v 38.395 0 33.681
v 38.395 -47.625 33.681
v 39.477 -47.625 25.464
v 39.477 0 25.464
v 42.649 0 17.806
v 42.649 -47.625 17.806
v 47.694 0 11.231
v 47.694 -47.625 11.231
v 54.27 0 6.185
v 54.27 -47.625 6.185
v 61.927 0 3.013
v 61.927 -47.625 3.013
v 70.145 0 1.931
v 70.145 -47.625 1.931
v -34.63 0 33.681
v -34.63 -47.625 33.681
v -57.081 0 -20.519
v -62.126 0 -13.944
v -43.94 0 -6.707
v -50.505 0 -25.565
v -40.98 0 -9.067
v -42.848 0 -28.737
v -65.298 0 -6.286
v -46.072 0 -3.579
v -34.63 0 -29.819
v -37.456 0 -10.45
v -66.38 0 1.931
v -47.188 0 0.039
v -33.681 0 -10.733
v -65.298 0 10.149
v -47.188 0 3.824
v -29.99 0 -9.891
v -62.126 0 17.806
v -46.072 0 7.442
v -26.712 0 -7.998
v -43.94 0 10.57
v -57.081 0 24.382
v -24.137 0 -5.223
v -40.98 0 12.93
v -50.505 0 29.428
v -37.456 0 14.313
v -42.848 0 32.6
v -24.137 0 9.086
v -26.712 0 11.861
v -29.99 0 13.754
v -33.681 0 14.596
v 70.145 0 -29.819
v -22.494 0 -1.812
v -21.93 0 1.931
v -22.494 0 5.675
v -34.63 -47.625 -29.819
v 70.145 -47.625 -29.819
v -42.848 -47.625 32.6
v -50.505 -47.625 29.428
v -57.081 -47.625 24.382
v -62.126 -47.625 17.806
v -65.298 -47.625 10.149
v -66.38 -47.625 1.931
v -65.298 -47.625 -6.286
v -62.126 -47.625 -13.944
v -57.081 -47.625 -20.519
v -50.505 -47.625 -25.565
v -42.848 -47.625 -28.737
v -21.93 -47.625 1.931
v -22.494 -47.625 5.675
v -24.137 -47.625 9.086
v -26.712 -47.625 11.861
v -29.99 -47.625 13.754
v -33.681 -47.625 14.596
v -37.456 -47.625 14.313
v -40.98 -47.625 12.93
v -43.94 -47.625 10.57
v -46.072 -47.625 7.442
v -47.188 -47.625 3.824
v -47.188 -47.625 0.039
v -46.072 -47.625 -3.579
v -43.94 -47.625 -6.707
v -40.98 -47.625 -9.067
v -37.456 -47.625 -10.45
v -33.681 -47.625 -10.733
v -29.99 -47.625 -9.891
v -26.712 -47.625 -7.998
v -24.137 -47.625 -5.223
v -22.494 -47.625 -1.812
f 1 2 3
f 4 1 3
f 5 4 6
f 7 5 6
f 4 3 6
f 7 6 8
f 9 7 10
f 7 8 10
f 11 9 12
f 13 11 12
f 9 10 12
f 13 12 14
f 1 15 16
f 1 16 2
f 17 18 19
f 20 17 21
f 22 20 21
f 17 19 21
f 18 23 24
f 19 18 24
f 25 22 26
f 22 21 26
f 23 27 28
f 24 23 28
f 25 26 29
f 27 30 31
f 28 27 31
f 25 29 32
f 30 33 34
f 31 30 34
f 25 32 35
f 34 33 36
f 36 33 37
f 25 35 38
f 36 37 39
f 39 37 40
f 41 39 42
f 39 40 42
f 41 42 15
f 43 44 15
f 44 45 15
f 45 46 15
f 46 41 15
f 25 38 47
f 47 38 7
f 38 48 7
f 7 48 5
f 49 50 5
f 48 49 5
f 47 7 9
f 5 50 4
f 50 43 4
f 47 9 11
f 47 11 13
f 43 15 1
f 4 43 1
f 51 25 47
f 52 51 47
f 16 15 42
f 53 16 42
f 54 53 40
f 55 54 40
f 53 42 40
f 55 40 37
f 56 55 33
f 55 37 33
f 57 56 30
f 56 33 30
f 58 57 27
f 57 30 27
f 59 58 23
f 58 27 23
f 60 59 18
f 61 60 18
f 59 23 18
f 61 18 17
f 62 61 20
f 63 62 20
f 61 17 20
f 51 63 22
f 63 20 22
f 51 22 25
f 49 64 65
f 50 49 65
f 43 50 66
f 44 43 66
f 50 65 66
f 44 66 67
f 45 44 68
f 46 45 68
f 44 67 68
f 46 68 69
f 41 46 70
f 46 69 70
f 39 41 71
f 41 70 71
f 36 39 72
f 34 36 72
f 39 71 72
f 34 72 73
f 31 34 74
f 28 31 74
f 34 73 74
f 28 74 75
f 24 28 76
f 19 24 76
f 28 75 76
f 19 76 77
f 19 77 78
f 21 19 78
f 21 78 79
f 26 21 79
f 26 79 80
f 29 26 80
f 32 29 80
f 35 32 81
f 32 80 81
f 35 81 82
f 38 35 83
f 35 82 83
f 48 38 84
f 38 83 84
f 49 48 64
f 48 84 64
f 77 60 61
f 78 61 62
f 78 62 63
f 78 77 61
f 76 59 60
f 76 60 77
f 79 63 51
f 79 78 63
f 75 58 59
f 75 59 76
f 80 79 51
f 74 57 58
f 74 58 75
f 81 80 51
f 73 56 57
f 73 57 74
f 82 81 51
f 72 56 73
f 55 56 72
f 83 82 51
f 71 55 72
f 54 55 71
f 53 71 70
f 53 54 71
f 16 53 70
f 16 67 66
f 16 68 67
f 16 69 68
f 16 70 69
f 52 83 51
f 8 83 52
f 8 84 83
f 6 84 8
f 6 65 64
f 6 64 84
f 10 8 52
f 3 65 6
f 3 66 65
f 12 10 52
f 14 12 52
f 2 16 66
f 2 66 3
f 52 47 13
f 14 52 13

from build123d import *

# Parameters (mm, degrees)
F0_W     = 104.775
F0_H     = 63.5
F1_DEPTH = 47.625
F2_R     = 12.7
F3_DEPTH = 47.625
F5_DEPTH = 47.625


with BuildPart() as f1:
    # F0 (on Front) → F1 (new body)
    with BuildSketch(Plane.XZ):
        with Locations((17.757324, 1.931498)):
            Rectangle(F0_W, F0_H)
        with BuildLine():
            Line((-34.630176, -29.818502), (-34.630176, 33.681498))
            ThreePointArc((-34.630176, 33.681498), (-66.380176, 1.931498), (-34.630176, -29.818502))
        make_face()
    extrude(amount=F1_DEPTH)

    # F2 (on face) → F3 (cut)
    with BuildSketch(Plane.XZ.offset(47.625)):
        with Locations((-34.630176, 1.931498)):
            Circle(F2_R)
    extrude(amount=-F3_DEPTH, mode=Mode.SUBTRACT)

    # F4 (on face) → F5 (cut)
    with BuildSketch(Plane.XZ.offset(47.625)):
        with BuildLine():
            Line((70.144824, 33.681498), (38.394824, 33.681498))
            ThreePointArc((38.394824, 33.681498), (47.694183, 11.230857), (70.144824, 1.931498))
            Line((70.144824, 1.931498), (70.144824, 33.681498))
        make_face()
    extrude(amount=-F5_DEPTH, mode=Mode.SUBTRACT)


solid = f1.part
